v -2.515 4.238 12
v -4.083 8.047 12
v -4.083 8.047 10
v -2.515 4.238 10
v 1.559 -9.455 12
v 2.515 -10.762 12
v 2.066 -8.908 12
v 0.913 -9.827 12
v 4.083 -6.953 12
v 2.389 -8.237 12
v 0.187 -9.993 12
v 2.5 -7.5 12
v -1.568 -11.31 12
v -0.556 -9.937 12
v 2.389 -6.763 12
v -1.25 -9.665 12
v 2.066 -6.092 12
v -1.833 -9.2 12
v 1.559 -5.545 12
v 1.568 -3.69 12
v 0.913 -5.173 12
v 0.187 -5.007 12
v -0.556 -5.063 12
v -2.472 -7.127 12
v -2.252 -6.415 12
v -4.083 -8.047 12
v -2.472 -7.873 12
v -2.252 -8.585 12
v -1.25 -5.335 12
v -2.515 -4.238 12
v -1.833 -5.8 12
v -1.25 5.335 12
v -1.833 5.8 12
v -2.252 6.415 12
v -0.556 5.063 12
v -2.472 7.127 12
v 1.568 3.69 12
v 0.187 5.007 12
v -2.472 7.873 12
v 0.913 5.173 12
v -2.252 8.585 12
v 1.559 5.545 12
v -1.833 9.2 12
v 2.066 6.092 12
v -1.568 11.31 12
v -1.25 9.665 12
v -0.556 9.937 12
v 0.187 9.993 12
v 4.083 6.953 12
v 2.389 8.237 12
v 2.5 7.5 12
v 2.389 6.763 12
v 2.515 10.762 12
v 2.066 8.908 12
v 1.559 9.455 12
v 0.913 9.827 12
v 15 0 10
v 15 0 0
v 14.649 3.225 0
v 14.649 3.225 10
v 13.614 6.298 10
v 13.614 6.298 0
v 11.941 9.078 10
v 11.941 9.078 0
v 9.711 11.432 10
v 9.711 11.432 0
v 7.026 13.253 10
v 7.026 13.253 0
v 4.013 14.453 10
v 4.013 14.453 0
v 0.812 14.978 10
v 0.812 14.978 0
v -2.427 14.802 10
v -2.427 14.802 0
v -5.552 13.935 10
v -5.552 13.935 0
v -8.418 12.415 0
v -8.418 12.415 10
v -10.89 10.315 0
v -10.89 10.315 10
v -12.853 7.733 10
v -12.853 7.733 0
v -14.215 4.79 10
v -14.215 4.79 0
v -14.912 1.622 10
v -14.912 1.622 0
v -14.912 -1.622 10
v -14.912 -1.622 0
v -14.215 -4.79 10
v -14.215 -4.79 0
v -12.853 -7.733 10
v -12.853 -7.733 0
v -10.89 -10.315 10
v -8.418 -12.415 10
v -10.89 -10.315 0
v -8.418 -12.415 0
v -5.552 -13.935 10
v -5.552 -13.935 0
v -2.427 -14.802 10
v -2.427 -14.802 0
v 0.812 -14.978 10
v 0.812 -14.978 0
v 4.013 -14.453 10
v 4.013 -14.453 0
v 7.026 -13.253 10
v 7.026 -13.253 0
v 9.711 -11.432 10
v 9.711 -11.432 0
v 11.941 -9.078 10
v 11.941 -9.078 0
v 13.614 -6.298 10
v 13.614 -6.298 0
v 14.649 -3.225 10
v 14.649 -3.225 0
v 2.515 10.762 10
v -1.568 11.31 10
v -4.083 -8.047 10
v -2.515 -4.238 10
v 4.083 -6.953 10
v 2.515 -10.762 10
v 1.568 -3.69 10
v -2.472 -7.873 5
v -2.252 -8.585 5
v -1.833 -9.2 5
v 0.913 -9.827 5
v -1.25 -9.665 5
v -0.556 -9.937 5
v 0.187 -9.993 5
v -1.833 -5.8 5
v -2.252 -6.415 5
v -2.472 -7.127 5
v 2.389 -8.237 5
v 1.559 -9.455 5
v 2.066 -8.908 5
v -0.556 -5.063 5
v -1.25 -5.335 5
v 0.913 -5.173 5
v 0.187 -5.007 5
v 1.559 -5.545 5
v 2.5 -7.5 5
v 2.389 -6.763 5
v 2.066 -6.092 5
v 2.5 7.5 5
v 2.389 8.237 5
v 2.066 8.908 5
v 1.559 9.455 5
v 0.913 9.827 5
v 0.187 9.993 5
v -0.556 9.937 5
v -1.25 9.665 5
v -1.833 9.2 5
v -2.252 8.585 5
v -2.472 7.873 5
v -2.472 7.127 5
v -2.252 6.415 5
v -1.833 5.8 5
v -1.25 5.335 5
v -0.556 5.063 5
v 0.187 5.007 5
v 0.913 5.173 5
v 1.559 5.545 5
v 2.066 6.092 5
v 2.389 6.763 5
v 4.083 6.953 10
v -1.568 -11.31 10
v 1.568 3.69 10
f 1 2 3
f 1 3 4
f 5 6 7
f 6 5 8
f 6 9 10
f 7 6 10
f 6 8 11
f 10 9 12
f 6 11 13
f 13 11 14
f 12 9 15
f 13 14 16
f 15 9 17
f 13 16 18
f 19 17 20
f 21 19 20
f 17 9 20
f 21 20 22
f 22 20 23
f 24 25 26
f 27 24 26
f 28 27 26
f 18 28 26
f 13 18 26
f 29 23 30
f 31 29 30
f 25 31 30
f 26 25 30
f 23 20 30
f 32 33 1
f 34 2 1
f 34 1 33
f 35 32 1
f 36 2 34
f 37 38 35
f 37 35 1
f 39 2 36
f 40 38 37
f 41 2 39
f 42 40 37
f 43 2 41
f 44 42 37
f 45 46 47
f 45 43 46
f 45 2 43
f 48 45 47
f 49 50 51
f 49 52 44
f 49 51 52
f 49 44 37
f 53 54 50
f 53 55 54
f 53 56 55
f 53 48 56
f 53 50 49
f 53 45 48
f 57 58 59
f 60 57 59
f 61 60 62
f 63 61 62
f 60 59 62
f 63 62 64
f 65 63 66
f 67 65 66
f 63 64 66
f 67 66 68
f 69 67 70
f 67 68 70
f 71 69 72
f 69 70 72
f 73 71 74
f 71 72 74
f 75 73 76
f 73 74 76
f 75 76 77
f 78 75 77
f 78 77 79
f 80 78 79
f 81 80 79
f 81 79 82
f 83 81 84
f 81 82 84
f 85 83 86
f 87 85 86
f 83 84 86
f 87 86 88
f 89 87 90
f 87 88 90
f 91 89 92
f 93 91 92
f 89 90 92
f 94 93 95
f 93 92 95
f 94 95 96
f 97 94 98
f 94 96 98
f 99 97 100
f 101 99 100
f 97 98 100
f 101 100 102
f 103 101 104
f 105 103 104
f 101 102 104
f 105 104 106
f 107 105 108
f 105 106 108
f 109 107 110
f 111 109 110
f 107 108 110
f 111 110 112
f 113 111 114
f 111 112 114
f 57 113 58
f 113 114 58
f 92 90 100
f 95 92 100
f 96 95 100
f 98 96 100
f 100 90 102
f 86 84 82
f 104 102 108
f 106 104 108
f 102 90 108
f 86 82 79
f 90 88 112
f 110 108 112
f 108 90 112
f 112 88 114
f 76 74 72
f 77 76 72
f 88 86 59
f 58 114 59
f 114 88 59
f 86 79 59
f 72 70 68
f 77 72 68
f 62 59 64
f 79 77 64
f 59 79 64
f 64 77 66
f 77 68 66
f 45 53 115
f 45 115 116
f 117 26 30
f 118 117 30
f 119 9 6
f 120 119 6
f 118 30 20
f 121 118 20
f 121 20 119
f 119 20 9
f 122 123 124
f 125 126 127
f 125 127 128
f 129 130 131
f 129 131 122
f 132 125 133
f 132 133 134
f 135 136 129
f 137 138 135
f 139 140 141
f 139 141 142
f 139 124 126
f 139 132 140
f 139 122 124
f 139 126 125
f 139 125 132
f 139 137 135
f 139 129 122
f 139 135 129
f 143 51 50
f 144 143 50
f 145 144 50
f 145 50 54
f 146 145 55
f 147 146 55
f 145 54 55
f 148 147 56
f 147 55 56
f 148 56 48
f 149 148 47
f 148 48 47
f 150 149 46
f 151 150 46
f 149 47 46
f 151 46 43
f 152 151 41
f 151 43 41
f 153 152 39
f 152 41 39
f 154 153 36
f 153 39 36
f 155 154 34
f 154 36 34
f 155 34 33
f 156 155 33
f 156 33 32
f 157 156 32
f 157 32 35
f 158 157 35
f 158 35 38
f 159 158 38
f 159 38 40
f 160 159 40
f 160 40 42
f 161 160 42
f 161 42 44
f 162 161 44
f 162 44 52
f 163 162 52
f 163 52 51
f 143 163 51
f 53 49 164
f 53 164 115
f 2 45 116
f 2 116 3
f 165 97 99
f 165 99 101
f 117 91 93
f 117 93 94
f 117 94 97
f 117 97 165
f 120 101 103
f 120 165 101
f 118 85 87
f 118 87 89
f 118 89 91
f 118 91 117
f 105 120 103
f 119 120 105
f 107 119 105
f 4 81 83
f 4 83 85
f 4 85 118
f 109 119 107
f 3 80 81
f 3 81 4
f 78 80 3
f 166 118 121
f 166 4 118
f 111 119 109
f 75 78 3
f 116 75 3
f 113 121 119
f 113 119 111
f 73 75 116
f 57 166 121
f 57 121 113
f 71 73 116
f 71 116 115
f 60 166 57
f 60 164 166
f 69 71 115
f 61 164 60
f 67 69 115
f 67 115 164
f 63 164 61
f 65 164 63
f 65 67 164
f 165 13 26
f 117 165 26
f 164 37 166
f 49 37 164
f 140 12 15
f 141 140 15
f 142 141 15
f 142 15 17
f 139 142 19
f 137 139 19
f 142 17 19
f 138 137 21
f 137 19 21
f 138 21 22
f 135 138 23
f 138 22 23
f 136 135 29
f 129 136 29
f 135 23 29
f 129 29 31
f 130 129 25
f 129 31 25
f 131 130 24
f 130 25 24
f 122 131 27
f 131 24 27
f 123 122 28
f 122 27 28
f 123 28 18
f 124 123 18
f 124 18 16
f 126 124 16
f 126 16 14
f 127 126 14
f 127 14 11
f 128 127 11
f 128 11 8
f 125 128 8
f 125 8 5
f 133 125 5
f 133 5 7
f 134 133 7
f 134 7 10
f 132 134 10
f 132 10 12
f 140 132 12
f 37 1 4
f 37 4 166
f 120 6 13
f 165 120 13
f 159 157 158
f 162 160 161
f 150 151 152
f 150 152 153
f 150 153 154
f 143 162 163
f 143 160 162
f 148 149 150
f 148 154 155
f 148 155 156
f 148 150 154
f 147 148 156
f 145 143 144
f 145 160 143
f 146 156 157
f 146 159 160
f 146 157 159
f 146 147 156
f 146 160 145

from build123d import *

# Parameters (mm, degrees)
IZIM1_R                     = 15
Y_KSEKLIK_EKSTR_ZYON1_DEPTH = 10
IZIM2_R                     = 2.5
KES_EKSTR_ZYON1_DEPTH       = 5
Y_KSEKLIK_EKSTR_ZYON3_START = 2
IZIM3_R                     = 2.5
Y_KSEKLIK_EKSTR_ZYON3_DEPTH = 2


with BuildPart() as part:
    # Çizim1 → Yükseklik-Ekstrüzyon1 (new body)
    with BuildSketch(Plane.XY):
        Circle(IZIM1_R)
    extrude(amount=Y_KSEKLIK_EKSTR_ZYON1_DEPTH)

    # Çizim2 → Kes-Ekstrüzyon1 (cut)
    with BuildSketch(Plane.XY.offset(10)):
        with Locations((0, 7.5)):
            Circle(IZIM2_R)
        with Locations((0, -7.5)):
            Circle(IZIM2_R)
    extrude(amount=-KES_EKSTR_ZYON1_DEPTH, mode=Mode.SUBTRACT)

    # Çizim3 → Yükseklik-Ekstrüzyon3 (add)
    # profile 1 of 2: a face of its own
    with BuildSketch(Plane.XY.offset(10).offset(Y_KSEKLIK_EKSTR_ZYON3_START)):
        Polygon((-4.083040029, 8.04725253), (-2.515454607, 4.237609875), (1.567585421, 3.690357346), (4.083040029, 6.95274747), (2.515454607, 10.762390125), (-1.567585421, 11.309642654), align=None)
        with Locations((0, 7.5)):
            Circle(IZIM3_R, mode=Mode.SUBTRACT)
    # profile 2 of 2: a face of its own
    with BuildSketch(Plane.XY.offset(10).offset(Y_KSEKLIK_EKSTR_ZYON3_START)):
        Polygon((1.567585421, -3.690357346), (4.083040029, -6.95274747), (2.515454607, -10.762390125), (-1.567585421, -11.309642654), (-4.083040029, -8.04725253), (-2.515454607, -4.237609875), align=None)
        with Locations((0, -7.5)):
            Circle(IZIM3_R, mode=Mode.SUBTRACT)
    extrude(amount=-Y_KSEKLIK_EKSTR_ZYON3_DEPTH)


solid = part.part
